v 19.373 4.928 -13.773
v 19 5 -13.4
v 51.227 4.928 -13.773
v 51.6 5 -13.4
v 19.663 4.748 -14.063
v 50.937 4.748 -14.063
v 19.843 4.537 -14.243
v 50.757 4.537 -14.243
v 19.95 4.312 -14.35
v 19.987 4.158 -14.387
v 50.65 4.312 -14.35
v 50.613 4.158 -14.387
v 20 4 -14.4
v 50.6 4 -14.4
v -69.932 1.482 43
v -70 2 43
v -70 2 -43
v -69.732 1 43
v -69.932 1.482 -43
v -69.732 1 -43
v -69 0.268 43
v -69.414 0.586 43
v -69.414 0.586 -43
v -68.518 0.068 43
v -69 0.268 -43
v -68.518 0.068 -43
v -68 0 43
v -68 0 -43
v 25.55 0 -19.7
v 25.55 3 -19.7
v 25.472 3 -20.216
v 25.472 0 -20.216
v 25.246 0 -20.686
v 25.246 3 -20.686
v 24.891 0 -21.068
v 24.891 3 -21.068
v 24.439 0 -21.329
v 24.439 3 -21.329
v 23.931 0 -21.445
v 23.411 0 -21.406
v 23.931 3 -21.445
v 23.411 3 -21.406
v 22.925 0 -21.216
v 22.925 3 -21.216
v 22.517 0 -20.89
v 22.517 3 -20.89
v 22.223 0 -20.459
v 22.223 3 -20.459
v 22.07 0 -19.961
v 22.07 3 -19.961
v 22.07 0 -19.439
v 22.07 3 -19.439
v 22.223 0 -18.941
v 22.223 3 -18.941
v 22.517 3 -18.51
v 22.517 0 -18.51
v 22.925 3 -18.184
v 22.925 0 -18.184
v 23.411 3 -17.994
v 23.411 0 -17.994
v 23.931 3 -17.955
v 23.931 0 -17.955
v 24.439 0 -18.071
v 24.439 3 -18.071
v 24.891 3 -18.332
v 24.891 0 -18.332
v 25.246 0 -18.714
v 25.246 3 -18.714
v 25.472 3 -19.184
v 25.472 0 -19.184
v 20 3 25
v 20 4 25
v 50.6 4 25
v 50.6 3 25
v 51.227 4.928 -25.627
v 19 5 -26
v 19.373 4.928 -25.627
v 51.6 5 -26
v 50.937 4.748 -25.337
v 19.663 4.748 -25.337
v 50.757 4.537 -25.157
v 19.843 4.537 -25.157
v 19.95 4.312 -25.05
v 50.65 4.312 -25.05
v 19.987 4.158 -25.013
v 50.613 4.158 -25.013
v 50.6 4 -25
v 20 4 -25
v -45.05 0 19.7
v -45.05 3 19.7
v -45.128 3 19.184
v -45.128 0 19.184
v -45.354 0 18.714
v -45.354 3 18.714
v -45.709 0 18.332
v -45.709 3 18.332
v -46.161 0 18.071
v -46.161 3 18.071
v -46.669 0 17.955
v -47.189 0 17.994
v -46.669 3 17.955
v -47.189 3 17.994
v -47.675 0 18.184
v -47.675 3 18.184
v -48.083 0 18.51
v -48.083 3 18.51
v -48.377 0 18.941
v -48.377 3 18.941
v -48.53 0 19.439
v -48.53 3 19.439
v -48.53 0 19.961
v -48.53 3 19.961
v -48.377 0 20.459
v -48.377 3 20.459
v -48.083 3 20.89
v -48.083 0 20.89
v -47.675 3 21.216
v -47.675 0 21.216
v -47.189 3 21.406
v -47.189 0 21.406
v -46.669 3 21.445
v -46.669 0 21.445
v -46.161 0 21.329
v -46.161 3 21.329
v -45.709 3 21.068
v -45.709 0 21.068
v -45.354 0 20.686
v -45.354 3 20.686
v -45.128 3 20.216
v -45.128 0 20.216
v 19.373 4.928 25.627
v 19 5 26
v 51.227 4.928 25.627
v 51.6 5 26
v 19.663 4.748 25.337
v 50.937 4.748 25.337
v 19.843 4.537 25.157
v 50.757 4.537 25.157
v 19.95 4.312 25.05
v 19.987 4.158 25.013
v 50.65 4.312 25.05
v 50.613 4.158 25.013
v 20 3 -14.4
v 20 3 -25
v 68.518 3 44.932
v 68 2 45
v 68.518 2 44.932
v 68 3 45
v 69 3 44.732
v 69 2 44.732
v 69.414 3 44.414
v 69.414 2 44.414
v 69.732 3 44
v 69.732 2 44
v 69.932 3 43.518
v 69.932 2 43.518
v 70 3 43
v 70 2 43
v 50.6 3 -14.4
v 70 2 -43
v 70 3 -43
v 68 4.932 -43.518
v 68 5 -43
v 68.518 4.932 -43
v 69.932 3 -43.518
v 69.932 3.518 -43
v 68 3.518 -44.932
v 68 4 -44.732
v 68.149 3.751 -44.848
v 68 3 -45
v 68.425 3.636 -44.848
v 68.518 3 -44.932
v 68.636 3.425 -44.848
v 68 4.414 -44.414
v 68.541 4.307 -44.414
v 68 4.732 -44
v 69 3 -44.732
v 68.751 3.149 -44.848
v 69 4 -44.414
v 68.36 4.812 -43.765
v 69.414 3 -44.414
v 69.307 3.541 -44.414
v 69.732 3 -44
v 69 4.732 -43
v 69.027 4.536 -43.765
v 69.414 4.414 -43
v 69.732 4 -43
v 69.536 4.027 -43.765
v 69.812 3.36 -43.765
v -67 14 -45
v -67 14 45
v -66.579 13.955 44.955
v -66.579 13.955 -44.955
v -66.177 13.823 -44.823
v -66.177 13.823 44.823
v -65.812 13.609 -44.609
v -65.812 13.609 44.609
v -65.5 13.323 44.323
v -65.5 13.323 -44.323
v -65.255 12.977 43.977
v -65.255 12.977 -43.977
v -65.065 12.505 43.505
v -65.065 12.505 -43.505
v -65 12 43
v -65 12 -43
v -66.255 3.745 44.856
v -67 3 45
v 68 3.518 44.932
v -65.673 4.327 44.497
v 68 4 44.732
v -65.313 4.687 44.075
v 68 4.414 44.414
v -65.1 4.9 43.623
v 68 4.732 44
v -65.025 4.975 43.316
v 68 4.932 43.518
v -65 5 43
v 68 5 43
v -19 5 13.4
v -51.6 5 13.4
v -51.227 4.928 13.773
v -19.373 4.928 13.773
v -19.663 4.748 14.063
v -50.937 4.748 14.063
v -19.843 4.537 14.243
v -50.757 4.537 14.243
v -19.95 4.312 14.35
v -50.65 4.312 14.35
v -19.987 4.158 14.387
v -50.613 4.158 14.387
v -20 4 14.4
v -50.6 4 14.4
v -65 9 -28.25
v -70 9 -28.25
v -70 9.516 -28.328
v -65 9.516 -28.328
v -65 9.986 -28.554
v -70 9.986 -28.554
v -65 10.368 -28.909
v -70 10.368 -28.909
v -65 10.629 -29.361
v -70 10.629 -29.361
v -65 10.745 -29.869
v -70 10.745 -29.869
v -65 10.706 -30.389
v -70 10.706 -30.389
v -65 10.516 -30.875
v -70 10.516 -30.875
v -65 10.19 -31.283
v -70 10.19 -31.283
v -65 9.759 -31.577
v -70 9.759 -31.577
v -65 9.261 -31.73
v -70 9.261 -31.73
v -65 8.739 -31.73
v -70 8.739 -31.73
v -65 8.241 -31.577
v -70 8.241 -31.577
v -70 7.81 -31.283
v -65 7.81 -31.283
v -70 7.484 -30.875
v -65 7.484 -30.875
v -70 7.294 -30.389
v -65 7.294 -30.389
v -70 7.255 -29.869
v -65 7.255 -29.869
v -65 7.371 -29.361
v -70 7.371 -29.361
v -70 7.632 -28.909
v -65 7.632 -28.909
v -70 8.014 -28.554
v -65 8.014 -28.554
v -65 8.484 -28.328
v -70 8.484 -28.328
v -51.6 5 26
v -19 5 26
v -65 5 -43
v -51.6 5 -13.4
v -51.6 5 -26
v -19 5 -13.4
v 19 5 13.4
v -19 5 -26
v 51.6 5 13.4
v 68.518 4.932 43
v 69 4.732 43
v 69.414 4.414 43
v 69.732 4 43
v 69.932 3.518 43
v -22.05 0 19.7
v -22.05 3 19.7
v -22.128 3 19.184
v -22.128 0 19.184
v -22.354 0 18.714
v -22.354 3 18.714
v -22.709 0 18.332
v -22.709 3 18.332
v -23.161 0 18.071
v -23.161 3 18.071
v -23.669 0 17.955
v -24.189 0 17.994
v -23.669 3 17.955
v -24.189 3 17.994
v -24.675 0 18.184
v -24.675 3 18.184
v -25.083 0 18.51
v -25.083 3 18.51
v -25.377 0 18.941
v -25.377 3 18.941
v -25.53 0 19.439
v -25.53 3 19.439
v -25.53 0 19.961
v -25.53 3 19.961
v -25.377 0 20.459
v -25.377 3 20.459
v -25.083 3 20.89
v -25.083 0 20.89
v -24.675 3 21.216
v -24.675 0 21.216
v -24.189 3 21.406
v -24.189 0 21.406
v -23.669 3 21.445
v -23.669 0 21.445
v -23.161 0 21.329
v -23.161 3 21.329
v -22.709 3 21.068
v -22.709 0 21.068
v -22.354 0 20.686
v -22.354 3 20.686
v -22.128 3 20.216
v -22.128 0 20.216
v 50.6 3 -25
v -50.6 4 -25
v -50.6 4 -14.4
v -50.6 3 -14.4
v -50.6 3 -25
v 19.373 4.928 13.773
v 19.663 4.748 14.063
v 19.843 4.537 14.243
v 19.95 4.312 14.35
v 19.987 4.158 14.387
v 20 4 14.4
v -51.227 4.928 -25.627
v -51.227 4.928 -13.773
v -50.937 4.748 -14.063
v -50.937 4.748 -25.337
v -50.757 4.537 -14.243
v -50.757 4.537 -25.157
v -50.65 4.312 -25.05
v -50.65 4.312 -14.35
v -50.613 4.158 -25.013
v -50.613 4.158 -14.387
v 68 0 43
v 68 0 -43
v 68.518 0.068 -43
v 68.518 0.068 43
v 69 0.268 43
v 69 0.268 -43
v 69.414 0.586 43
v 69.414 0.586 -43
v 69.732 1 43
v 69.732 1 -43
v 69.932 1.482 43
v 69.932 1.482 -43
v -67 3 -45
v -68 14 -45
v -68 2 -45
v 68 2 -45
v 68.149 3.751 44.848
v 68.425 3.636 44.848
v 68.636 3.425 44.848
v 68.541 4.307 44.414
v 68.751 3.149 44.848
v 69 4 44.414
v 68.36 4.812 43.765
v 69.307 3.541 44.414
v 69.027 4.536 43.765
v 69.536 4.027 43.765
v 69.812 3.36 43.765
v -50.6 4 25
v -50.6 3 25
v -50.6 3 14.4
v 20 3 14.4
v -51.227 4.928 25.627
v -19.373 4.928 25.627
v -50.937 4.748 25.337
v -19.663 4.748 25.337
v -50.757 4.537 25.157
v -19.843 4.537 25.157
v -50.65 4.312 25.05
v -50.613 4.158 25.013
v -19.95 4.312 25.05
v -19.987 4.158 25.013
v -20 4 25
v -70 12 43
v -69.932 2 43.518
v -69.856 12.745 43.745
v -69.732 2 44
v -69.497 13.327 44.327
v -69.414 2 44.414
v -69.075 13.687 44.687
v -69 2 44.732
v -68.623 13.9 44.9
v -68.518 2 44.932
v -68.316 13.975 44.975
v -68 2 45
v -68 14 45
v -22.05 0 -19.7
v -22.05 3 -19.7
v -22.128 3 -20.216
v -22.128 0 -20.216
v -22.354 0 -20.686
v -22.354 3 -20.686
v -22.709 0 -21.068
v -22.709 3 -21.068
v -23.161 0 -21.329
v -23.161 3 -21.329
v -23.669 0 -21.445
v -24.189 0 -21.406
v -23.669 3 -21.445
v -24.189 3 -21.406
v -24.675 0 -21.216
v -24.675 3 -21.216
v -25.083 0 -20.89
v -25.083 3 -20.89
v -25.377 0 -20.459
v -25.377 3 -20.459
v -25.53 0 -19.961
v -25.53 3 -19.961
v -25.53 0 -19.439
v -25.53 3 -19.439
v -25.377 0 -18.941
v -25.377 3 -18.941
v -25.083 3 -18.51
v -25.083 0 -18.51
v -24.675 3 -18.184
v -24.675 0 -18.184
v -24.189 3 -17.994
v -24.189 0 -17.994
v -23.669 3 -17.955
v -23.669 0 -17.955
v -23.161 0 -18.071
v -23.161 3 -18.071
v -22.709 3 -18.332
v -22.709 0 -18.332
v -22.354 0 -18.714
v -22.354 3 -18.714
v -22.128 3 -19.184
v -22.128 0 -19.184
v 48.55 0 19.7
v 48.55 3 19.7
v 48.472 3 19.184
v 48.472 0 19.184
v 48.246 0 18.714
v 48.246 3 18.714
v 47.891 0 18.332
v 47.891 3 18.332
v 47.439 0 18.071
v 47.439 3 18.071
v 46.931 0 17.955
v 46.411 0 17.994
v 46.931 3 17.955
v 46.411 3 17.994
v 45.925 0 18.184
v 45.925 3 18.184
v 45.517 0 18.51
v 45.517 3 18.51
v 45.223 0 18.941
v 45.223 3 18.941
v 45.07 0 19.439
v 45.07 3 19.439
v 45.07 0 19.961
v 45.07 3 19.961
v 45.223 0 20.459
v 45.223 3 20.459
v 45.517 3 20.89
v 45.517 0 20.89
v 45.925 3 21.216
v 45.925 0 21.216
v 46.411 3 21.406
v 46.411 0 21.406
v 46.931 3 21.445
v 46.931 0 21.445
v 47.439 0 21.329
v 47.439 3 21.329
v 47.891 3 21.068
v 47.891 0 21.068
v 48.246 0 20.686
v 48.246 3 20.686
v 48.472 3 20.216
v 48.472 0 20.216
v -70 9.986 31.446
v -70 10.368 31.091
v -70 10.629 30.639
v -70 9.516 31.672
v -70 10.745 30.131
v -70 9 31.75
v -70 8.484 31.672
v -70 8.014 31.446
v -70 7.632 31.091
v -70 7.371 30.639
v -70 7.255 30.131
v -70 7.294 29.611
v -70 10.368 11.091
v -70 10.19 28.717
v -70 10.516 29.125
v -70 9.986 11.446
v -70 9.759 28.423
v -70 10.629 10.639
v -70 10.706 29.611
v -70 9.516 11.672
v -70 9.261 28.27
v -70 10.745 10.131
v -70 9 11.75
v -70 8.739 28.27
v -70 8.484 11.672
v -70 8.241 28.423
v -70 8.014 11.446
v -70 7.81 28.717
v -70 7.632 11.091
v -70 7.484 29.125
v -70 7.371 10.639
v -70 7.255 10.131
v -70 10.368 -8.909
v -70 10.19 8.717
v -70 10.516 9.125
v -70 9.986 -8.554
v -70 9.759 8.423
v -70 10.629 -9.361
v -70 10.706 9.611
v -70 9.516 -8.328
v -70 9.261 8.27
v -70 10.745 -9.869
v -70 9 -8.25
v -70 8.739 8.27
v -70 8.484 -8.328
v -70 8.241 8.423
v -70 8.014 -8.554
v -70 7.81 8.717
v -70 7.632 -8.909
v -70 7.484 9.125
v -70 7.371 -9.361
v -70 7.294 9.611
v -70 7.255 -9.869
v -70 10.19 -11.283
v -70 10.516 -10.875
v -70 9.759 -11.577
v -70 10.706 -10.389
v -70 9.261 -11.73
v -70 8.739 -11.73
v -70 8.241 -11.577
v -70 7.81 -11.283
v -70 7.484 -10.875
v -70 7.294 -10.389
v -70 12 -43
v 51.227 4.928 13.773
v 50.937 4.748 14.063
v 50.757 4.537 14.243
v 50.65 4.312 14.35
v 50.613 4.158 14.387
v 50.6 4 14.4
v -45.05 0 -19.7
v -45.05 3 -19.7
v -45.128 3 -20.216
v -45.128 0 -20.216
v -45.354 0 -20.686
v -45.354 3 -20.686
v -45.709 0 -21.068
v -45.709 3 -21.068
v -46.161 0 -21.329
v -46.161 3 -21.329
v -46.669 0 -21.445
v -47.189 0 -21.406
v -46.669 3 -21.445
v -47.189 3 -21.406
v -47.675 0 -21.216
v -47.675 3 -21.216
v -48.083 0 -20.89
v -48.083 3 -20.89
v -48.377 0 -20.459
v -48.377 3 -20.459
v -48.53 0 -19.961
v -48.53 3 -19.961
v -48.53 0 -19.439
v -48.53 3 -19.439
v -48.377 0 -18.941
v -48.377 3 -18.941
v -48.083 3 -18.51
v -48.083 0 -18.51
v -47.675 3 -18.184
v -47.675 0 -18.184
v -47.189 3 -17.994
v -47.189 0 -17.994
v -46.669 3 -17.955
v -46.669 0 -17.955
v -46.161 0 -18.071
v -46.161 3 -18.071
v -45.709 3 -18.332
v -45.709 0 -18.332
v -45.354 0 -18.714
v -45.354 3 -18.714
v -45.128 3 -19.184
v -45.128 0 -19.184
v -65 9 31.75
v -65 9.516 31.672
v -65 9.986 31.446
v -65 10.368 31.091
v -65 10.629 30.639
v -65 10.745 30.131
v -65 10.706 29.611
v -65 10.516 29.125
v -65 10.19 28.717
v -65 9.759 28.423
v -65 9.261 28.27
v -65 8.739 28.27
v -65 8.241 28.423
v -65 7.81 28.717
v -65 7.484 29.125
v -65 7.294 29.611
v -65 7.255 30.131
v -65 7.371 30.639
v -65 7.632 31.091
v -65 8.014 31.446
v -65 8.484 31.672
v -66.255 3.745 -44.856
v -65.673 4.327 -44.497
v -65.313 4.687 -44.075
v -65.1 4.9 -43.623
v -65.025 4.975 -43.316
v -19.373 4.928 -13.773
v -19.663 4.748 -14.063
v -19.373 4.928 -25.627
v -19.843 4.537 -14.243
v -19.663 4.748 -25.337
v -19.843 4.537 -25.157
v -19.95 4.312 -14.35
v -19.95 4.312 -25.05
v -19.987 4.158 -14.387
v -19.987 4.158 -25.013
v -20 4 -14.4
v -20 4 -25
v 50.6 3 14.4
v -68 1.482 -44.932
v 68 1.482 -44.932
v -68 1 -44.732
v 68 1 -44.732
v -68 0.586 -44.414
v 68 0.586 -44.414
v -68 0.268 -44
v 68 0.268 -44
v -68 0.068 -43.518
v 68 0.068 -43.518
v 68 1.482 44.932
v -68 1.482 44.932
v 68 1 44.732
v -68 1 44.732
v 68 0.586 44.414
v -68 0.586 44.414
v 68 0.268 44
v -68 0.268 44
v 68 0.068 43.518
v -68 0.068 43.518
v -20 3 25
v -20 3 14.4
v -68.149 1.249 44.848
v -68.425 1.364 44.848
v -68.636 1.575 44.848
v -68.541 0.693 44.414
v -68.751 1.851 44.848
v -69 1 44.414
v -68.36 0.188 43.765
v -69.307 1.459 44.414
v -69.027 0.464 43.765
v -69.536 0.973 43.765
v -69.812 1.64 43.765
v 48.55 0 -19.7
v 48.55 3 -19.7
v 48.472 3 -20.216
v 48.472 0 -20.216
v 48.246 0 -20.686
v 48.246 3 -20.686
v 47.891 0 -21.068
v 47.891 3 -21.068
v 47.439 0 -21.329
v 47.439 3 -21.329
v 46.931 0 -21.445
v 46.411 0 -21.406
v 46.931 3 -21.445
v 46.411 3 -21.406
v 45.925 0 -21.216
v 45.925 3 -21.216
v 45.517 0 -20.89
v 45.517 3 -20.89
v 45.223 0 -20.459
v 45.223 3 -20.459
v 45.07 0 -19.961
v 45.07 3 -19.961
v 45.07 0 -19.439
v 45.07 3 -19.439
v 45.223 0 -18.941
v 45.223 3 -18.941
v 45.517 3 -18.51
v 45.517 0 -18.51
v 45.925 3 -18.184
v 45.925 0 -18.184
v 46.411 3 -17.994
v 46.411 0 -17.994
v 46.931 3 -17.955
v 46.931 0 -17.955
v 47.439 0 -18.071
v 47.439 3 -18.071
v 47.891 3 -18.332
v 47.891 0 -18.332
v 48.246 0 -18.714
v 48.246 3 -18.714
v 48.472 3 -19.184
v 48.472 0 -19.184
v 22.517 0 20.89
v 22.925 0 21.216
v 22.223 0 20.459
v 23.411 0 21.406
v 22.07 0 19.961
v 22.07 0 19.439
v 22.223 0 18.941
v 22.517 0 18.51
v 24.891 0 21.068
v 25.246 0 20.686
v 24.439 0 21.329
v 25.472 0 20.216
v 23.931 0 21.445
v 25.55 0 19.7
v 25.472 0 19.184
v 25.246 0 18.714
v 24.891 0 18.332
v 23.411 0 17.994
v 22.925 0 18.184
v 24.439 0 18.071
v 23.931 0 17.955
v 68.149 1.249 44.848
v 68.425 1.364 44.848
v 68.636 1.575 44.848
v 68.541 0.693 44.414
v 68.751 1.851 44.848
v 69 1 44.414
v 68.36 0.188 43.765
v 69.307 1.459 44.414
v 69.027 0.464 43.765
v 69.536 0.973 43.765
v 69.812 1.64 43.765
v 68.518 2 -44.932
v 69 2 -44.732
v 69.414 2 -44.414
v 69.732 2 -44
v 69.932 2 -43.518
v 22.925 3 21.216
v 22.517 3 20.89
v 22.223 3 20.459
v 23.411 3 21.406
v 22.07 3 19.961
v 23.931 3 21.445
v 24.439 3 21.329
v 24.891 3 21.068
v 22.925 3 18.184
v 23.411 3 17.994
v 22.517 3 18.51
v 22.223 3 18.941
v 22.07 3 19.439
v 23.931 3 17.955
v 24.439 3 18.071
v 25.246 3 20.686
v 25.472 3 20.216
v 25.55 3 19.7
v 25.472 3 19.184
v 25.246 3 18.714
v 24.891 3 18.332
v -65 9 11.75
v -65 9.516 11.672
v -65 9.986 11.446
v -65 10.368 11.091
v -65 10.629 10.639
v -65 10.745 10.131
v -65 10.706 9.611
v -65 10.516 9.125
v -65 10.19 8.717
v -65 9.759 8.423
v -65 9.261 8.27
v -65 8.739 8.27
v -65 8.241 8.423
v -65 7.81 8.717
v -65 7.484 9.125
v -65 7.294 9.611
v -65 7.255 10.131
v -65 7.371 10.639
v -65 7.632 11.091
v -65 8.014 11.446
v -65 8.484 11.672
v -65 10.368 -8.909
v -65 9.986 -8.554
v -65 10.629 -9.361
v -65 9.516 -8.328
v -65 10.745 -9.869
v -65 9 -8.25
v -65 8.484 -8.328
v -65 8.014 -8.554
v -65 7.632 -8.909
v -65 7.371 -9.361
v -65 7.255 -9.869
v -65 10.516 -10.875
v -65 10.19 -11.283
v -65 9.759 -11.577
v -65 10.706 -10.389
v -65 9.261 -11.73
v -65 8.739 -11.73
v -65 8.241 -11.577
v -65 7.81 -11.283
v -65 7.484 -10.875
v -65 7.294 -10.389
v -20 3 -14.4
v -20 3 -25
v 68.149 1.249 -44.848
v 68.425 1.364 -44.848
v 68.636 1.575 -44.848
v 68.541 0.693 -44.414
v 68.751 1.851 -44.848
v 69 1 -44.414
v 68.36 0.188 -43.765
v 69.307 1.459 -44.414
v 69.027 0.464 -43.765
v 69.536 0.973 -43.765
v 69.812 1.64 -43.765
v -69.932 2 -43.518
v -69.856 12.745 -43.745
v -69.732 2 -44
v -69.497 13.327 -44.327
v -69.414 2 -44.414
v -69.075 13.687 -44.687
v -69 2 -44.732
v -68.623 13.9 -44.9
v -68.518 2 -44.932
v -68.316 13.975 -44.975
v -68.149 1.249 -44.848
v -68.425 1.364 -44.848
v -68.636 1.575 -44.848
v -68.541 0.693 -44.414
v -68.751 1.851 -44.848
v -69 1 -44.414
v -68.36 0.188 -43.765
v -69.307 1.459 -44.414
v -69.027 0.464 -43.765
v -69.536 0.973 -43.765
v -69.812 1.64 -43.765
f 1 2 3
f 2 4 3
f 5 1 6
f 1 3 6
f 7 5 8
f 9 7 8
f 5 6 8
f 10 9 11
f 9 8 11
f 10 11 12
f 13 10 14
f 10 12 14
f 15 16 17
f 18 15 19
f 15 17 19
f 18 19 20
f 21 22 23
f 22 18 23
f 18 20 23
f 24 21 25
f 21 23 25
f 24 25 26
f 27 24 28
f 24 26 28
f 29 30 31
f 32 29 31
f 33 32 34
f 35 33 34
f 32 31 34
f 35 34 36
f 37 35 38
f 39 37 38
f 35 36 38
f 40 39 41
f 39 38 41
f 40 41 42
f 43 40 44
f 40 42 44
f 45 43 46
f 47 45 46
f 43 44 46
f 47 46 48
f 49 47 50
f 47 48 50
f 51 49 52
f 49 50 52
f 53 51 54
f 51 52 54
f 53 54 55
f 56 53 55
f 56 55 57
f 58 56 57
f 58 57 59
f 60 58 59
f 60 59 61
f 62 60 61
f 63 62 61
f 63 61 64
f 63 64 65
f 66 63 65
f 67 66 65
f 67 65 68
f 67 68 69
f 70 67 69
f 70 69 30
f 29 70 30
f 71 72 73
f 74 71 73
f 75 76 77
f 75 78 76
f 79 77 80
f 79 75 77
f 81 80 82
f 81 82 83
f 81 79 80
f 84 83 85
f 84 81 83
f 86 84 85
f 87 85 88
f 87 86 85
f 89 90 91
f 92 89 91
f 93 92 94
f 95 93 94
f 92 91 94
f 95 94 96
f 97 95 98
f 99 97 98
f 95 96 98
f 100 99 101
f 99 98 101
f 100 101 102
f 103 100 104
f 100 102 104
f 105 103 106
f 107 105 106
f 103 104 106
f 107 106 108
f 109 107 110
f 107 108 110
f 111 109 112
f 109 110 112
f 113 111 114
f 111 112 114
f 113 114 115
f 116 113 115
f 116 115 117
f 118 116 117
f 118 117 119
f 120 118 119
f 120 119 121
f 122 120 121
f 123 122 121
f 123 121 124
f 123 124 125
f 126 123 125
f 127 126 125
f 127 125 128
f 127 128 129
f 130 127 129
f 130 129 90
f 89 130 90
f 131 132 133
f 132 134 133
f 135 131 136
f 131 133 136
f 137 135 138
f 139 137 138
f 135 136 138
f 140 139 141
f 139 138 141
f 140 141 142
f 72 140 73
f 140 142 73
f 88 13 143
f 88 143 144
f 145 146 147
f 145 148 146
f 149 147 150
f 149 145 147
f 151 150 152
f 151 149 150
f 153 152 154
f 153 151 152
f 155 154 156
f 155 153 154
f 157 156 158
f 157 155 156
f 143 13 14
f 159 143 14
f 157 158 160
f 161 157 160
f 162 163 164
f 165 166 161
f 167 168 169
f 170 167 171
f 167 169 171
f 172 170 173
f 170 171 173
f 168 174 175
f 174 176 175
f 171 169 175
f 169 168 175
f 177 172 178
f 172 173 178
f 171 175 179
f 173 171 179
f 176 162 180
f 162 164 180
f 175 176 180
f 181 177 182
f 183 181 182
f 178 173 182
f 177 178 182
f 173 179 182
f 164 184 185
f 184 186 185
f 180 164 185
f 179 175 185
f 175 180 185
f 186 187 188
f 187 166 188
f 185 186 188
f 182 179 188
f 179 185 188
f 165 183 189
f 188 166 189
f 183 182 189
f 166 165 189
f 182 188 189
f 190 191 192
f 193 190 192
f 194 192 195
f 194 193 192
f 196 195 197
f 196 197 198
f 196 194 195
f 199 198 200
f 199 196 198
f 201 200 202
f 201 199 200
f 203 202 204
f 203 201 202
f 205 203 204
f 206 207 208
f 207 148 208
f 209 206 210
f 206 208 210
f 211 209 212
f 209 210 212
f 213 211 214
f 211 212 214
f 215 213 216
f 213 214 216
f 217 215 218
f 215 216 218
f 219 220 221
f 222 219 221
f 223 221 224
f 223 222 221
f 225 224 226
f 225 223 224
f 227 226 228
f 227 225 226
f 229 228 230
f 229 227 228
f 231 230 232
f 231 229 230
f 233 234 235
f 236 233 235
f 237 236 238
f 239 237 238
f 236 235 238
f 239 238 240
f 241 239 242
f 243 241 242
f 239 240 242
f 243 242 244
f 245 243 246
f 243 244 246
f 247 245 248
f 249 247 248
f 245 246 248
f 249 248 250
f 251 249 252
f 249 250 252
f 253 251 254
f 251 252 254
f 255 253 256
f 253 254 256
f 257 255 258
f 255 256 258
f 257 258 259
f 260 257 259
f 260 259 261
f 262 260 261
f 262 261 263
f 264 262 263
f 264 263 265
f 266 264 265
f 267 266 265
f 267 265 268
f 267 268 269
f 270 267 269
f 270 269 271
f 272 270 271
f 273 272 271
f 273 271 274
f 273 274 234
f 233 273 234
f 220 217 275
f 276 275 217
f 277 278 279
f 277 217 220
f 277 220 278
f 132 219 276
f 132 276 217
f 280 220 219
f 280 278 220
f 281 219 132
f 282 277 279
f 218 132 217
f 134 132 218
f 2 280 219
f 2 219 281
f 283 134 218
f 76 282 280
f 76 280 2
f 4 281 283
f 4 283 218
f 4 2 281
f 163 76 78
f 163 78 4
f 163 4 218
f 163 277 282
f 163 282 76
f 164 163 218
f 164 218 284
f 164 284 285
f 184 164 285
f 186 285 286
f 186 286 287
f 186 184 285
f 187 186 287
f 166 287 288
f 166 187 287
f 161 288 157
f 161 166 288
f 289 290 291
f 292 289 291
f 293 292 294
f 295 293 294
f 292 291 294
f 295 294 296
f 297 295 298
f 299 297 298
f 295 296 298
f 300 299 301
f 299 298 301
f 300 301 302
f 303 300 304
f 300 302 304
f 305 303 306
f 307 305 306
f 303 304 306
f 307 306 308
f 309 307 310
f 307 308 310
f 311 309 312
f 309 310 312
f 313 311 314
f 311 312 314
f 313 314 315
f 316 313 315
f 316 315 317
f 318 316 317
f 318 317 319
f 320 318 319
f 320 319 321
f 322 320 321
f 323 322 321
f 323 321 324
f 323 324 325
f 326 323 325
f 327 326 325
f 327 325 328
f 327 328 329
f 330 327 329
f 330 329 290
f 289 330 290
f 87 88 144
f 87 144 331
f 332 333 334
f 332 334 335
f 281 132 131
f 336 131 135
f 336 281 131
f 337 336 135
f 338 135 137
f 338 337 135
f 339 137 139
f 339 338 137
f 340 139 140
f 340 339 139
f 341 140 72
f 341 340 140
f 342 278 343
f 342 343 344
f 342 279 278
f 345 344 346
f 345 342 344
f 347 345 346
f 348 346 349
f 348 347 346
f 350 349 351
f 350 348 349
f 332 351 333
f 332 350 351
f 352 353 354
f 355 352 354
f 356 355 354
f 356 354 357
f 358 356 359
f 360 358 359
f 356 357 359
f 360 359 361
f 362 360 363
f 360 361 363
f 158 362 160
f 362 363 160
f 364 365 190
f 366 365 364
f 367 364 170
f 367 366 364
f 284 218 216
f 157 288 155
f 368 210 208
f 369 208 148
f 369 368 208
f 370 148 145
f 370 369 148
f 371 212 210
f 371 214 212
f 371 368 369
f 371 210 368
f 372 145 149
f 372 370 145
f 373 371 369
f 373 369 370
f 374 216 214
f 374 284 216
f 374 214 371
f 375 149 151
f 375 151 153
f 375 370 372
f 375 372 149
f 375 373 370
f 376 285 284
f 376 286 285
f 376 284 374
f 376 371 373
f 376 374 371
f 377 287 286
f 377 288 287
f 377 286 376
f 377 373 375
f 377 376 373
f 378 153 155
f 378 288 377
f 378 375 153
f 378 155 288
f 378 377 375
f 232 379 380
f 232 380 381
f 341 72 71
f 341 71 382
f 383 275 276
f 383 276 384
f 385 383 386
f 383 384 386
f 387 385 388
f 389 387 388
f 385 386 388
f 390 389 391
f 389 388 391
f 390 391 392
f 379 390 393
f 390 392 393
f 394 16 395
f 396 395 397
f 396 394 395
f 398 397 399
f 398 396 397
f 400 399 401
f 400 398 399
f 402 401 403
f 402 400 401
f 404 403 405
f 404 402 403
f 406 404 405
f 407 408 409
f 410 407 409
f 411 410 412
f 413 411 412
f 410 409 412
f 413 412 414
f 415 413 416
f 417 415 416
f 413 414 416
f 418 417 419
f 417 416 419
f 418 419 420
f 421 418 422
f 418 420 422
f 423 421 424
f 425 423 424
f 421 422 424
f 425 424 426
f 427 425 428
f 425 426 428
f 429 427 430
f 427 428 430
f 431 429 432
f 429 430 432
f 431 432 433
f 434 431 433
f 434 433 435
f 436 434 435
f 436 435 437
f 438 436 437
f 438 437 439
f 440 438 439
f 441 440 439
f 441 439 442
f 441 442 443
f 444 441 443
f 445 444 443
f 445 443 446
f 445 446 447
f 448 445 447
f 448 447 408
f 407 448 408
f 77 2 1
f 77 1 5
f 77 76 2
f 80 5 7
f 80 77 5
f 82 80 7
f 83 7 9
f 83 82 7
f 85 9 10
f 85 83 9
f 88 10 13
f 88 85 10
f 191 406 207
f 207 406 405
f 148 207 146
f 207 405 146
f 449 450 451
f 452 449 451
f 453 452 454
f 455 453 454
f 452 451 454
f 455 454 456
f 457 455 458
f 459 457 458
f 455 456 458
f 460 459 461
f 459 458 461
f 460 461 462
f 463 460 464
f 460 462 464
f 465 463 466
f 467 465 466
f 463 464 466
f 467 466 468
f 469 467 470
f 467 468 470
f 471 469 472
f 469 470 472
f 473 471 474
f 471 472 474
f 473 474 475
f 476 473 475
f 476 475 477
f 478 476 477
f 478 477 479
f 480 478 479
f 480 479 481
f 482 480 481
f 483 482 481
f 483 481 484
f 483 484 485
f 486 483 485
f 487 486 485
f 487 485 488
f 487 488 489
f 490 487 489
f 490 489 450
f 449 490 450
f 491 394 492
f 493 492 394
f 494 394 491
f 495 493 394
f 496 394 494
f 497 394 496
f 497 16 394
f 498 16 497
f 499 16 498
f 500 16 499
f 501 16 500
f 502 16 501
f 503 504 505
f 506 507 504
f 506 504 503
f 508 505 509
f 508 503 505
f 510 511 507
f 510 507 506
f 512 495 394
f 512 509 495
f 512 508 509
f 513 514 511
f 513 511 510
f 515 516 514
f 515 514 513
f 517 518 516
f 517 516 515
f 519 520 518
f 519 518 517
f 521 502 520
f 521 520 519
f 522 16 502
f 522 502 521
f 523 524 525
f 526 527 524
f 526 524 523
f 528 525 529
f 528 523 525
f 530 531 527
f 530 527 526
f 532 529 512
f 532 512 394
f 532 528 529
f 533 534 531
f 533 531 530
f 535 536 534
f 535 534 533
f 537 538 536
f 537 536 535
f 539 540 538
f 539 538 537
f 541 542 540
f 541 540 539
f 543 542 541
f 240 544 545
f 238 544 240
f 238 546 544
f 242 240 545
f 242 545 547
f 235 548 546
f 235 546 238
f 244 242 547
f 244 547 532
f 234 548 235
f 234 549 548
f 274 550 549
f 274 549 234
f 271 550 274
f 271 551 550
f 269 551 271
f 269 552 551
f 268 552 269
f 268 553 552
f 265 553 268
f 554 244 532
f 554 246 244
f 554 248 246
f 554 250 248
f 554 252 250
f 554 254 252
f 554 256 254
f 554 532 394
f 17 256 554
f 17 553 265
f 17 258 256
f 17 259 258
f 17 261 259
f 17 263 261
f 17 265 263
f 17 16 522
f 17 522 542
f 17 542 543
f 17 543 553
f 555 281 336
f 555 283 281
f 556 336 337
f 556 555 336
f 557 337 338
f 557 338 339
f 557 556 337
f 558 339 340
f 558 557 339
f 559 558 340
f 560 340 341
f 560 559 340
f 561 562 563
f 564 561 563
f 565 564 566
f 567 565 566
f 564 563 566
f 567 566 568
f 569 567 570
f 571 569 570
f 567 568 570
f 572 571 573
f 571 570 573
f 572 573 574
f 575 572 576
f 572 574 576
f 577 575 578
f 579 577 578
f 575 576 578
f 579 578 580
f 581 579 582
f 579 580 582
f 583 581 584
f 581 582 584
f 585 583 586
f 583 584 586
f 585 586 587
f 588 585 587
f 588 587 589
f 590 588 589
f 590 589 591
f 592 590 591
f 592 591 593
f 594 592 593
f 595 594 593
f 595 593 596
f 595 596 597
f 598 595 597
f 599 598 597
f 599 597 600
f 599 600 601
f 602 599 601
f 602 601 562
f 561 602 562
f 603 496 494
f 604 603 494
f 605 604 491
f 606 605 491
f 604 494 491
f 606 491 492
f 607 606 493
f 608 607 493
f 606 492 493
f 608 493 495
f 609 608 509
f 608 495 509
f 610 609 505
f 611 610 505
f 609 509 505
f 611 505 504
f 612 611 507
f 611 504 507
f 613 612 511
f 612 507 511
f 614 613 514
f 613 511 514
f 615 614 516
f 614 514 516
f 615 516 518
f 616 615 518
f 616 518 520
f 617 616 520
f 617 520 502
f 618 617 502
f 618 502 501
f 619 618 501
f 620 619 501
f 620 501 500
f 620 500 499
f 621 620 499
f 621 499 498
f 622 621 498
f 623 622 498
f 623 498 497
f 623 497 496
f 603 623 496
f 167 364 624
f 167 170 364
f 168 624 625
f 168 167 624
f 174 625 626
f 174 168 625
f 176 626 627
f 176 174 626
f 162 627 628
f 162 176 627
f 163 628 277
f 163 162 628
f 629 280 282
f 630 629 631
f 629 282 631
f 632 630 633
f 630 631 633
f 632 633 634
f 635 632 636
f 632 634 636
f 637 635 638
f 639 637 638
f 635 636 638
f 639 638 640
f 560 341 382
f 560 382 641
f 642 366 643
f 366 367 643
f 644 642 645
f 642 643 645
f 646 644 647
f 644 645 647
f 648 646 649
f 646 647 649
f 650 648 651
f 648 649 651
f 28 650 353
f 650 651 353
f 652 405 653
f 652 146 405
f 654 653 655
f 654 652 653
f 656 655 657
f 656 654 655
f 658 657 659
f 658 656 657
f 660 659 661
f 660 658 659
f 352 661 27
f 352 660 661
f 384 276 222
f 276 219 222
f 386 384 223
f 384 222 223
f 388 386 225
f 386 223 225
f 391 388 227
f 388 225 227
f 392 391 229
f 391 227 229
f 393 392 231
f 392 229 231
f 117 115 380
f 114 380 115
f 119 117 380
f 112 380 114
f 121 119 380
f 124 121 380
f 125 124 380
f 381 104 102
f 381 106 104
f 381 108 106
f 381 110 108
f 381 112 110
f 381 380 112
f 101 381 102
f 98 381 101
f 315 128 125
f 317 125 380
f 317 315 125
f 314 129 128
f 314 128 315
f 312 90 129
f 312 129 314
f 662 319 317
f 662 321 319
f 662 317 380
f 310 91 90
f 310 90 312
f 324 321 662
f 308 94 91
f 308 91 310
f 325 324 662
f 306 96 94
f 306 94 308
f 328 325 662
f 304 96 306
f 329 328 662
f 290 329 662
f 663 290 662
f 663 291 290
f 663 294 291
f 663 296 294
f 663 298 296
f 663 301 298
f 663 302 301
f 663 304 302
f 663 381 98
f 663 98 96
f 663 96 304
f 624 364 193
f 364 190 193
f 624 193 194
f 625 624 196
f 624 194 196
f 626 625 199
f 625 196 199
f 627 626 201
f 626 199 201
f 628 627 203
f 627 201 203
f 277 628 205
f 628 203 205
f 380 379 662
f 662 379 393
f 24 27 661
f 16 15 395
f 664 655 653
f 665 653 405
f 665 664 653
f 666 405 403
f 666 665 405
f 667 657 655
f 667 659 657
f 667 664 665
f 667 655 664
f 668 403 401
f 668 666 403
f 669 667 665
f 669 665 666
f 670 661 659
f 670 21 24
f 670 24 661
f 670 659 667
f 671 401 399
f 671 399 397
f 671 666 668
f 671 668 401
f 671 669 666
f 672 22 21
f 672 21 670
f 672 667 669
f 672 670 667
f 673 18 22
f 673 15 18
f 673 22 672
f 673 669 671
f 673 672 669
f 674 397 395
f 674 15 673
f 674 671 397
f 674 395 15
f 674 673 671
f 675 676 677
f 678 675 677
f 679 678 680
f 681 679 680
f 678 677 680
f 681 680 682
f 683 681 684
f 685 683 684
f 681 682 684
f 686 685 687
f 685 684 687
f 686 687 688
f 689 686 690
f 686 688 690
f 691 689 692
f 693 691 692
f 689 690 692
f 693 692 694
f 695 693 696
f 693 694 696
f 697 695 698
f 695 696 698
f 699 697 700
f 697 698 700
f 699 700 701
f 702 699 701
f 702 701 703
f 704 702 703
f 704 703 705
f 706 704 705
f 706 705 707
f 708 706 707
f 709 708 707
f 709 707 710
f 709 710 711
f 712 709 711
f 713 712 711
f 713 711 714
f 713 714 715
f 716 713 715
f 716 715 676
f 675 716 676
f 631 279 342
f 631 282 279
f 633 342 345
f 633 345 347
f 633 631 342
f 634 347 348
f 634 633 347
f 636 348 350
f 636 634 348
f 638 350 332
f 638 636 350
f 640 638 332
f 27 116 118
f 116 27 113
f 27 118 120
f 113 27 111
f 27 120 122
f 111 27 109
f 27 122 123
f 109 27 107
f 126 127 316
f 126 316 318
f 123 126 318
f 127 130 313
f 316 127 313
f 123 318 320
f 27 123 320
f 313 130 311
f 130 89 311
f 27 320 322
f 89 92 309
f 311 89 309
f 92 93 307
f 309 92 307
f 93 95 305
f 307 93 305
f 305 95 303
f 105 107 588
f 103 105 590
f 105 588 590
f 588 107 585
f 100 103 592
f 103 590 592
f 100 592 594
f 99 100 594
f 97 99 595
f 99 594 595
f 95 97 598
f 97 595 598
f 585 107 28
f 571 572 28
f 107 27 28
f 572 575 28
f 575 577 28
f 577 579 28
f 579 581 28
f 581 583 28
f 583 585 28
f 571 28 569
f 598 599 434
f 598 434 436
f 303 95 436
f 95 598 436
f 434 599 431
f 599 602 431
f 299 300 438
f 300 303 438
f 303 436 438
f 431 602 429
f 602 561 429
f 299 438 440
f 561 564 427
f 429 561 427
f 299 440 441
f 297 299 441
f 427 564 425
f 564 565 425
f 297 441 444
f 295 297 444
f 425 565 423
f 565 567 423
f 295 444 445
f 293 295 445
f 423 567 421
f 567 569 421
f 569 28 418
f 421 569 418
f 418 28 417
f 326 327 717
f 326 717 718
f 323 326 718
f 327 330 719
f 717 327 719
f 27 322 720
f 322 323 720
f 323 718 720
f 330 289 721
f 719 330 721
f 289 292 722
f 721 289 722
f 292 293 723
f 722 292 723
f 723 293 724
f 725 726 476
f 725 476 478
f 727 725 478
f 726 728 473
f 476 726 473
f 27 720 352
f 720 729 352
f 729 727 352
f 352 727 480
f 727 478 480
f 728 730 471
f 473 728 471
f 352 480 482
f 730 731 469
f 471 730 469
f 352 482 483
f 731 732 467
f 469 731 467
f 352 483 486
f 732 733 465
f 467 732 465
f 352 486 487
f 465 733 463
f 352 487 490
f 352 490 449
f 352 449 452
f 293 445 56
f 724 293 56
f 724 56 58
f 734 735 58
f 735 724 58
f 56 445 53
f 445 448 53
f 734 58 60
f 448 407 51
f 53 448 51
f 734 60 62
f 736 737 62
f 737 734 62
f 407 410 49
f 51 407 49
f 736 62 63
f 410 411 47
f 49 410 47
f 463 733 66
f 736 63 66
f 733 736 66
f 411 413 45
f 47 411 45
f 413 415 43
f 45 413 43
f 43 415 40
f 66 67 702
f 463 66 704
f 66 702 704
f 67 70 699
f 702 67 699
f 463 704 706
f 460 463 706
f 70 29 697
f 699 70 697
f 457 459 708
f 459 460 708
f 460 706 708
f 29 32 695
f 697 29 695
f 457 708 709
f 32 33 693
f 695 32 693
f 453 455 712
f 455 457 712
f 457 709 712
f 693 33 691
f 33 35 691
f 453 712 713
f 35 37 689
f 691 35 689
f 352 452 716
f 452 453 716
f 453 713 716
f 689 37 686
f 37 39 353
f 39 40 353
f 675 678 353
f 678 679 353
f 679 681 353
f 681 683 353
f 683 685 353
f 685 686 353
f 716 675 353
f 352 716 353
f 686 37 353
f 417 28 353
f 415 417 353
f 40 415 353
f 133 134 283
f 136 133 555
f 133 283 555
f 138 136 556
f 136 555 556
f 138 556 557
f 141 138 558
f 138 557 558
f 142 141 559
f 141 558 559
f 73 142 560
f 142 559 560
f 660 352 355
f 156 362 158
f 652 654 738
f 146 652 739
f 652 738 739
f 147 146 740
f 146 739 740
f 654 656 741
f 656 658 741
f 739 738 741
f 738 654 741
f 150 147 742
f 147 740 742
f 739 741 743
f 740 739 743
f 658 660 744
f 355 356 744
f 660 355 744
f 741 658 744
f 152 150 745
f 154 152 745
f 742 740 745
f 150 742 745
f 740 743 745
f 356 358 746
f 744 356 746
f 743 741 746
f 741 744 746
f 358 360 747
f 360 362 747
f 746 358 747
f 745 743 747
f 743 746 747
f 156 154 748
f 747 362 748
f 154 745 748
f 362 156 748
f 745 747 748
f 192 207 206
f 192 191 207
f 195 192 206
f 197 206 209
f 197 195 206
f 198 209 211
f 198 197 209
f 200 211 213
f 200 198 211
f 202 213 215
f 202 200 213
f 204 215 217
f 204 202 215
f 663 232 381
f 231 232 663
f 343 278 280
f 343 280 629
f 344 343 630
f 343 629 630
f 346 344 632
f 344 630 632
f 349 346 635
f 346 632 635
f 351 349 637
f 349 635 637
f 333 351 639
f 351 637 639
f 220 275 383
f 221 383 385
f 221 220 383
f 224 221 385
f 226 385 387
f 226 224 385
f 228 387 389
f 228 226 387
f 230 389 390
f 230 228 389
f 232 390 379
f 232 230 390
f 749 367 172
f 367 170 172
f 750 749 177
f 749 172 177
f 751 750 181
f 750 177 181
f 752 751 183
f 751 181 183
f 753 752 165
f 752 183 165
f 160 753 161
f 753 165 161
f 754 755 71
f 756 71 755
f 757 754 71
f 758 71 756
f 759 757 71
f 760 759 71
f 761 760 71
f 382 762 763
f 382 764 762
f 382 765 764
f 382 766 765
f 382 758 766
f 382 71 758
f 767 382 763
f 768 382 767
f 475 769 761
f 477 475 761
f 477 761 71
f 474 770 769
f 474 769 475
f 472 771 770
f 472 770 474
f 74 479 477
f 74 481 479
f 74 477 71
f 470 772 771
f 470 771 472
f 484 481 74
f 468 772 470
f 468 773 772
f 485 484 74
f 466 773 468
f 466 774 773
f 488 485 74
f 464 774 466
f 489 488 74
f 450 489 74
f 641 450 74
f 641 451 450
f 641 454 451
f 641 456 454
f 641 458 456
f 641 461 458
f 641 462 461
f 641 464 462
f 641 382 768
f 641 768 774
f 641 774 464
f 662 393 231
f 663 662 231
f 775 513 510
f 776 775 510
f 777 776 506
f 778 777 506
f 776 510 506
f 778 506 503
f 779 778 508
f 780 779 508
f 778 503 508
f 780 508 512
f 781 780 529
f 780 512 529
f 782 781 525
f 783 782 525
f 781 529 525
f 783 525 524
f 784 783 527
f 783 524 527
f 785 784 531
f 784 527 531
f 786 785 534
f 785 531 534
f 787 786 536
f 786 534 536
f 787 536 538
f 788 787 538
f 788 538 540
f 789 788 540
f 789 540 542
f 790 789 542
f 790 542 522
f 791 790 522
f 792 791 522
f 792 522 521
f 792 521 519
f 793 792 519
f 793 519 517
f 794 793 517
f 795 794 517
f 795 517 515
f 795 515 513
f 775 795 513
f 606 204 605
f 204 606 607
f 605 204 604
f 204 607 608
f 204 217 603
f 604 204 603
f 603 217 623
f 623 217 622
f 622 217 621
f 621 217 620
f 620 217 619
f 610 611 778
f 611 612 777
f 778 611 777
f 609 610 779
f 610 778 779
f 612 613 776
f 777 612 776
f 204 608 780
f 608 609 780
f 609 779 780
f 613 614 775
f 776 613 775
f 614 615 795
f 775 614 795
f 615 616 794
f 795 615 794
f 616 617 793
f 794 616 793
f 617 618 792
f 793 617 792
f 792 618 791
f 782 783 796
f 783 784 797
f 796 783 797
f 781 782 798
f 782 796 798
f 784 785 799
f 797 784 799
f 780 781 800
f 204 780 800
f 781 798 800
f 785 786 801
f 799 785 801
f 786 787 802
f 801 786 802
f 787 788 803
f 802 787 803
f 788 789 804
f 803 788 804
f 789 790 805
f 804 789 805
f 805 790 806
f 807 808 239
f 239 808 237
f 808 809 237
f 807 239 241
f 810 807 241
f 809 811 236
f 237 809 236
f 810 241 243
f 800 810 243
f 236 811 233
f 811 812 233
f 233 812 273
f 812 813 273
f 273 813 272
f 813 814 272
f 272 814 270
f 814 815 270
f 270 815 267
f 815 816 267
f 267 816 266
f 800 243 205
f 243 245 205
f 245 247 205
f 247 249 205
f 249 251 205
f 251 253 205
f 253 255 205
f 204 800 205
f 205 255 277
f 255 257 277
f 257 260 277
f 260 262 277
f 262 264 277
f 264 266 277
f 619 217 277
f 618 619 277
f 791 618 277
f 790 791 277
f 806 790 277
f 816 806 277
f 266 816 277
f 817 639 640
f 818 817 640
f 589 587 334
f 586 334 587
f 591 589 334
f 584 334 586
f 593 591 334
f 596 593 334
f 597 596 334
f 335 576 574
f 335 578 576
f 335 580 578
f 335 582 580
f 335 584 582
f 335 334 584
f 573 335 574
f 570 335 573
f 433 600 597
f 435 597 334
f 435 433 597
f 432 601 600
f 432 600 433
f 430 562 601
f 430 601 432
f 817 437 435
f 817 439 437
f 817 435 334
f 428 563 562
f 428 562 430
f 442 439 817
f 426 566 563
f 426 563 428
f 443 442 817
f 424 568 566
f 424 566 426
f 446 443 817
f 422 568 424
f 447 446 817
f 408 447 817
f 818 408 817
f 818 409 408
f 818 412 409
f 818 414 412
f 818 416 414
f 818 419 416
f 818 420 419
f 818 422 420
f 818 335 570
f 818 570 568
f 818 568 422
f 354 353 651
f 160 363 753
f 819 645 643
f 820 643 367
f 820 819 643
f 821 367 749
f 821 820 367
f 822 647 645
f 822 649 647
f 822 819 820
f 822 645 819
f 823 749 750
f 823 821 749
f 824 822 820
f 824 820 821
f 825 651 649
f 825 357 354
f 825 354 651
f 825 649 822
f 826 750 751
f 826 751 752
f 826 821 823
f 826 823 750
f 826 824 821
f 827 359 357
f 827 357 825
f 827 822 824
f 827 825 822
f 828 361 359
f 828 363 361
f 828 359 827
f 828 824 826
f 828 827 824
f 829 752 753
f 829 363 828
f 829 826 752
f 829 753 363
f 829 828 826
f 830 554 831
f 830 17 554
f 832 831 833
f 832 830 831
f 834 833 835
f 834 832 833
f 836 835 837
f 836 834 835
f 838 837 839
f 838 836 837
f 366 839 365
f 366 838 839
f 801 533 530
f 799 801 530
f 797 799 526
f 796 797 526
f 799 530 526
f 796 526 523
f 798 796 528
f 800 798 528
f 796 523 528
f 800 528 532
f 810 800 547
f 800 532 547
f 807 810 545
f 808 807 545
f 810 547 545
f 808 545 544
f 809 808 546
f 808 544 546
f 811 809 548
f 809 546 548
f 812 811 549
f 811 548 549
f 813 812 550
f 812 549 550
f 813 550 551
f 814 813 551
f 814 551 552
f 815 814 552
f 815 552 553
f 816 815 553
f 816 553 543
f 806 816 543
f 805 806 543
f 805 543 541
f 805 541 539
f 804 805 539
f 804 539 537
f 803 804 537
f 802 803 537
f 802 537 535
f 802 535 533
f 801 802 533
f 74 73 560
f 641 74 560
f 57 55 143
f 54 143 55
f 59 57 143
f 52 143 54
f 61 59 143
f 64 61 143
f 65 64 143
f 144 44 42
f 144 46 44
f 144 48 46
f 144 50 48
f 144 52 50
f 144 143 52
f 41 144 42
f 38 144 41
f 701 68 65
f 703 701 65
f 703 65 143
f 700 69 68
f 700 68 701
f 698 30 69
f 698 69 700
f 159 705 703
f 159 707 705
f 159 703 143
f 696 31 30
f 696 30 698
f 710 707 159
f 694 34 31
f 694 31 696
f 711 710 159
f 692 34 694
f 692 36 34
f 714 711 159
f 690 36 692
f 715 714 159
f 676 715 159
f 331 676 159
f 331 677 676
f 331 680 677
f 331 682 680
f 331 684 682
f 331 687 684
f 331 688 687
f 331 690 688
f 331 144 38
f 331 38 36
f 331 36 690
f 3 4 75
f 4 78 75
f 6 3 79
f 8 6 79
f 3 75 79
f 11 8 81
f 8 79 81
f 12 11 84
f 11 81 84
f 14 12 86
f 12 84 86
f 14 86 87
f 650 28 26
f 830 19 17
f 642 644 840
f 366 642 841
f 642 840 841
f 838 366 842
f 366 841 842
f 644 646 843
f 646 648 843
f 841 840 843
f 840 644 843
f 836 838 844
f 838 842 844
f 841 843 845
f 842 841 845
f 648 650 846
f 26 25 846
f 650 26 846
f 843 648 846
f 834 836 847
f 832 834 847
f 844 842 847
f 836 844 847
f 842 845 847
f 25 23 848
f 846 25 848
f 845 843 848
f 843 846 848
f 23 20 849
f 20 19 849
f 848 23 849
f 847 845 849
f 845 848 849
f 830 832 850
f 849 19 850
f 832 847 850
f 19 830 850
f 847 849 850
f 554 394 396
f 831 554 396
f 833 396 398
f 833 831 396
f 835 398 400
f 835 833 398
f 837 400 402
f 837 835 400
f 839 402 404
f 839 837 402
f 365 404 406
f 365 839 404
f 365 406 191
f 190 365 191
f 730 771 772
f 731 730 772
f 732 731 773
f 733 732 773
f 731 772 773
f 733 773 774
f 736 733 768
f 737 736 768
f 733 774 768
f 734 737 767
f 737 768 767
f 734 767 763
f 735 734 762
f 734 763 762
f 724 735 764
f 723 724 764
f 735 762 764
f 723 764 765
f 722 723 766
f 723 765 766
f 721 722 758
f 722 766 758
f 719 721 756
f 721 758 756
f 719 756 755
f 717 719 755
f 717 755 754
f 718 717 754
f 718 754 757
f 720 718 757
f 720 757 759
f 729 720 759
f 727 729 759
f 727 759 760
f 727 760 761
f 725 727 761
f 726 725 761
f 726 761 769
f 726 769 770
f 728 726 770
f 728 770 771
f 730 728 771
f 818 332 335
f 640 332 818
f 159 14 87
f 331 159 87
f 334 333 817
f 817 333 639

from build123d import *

# Parameters (mm, degrees)
SKETCH_1_W          = 140
SKETCH_1_H          = 90
EXTRUDE_1_DEPTH     = 5
SKETCH_2_W          = 5
SKETCH_2_H          = 90
EXTRUDE_2_DEPTH     = 9
SKETCH_3_R          = 1.75
CUT_EXTRUDE_1_DEPTH = 11
SKETCH_5_W          = 30.6
SKETCH_5_H          = 10.6
SKETCH_5_R          = 1.75
CUT_EXTRUDE_2_DEPTH = 2
SKETCH_5_3_R        = 1.75
CUT_EXTRUDE_3_DEPTH = 84.701851831
FILLET_1_R          = 2
FILLET_2_R          = 1


with BuildPart() as part:
    # ｽｹｯﾁ1 → ﾎﾞｽ - 押し出し1 (new body)
    with BuildSketch(Plane(origin=(0, 0, 0), x_dir=(1, 0, 0), z_dir=(0, 1, 0))):
        Rectangle(SKETCH_1_W, SKETCH_1_H)
    extrude(amount=EXTRUDE_1_DEPTH)

    # ｽｹｯﾁ2 → ﾎﾞｽ - 押し出し2 (add)
    with BuildSketch(Plane(origin=(0, 5, 0), x_dir=(1, 0, 0), z_dir=(0, 1, 0))):
        with Locations((-67.5, 0)):
            Rectangle(SKETCH_2_W, SKETCH_2_H)
    extrude(amount=EXTRUDE_2_DEPTH)

    # ｽｹｯﾁ3 → ｶｯﾄ - 押し出し1 (cut)
    with BuildSketch(Plane.ZY.offset(70)):
        with Locations((-30, 9)):
            Circle(SKETCH_3_R)
        with Locations((-10, 9)):
            Circle(SKETCH_3_R)
        with Locations((30, 9)):
            Circle(SKETCH_3_R)
        with Locations((10, 9)):
            Circle(SKETCH_3_R)
    extrude(amount=-CUT_EXTRUDE_1_DEPTH, mode=Mode.SUBTRACT)

    # ｽｹｯﾁ5 → ｶｯﾄ - 押し出し2 (cut)
    # profile 1 of 4: a face of its own
    with BuildSketch(Plane(origin=(0, 5, 0), x_dir=(1, 0, 0), z_dir=(0, 1, 0))):
        with Locations((-35.3, -19.7)):
            Rectangle(SKETCH_5_W, SKETCH_5_H)
        with Locations((-46.8, -19.7)):
            Circle(SKETCH_5_R, mode=Mode.SUBTRACT)
        with Locations((-23.8, -19.7)):
            Circle(SKETCH_5_R, mode=Mode.SUBTRACT)
    # profile 2 of 4: a face of its own
    with BuildSketch(Plane(origin=(0, 5, 0), x_dir=(1, 0, 0), z_dir=(0, 1, 0))):
        with Locations((-35.3, 19.7)):
            Rectangle(SKETCH_5_W, SKETCH_5_H)
        with Locations((-23.8, 19.7)):
            Circle(SKETCH_5_R, mode=Mode.SUBTRACT)
        with Locations((-46.8, 19.7)):
            Circle(SKETCH_5_R, mode=Mode.SUBTRACT)
    # profile 3 of 4: a face of its own
    with BuildSketch(Plane(origin=(0, 5, 0), x_dir=(1, 0, 0), z_dir=(0, 1, 0))):
        with Locations((35.3, 19.7)):
            Rectangle(SKETCH_5_W, SKETCH_5_H)
        with Locations((46.8, 19.7)):
            Circle(SKETCH_5_R, mode=Mode.SUBTRACT)
        with Locations((23.8, 19.7)):
            Circle(SKETCH_5_R, mode=Mode.SUBTRACT)
    # profile 4 of 4: a face of its own
    with BuildSketch(Plane(origin=(0, 5, 0), x_dir=(1, 0, 0), z_dir=(0, 1, 0))):
        with Locations((35.3, -19.7)):
            Rectangle(SKETCH_5_W, SKETCH_5_H)
        with Locations((23.8, -19.7)):
            Circle(SKETCH_5_R, mode=Mode.SUBTRACT)
        with Locations((46.8, -19.7)):
            Circle(SKETCH_5_R, mode=Mode.SUBTRACT)
    extrude(amount=-CUT_EXTRUDE_2_DEPTH, mode=Mode.SUBTRACT)

    # ｽｹｯﾁ5<3> → ｶｯﾄ - 押し出し3 (cut, through all)
    with BuildSketch(Plane(origin=(0, 5, 0), x_dir=(1, 0, 0), z_dir=(0, 1, 0))):
        with Locations((-46.8, -19.7)):
            Circle(SKETCH_5_3_R)
        with Locations((-23.8, -19.7)):
            Circle(SKETCH_5_3_R)
        with Locations((-23.8, 19.7)):
            Circle(SKETCH_5_3_R)
        with Locations((-46.8, 19.7)):
            Circle(SKETCH_5_3_R)
        with Locations((46.8, 19.7)):
            Circle(SKETCH_5_3_R)
        with Locations((23.8, 19.7)):
            Circle(SKETCH_5_3_R)
        with Locations((23.8, -19.7)):
            Circle(SKETCH_5_3_R)
        with Locations((46.8, -19.7)):
            Circle(SKETCH_5_3_R)
    extrude(amount=-CUT_EXTRUDE_3_DEPTH, mode=Mode.SUBTRACT)

    # ﾌｨﾚｯﾄ1
    fillet_1_edges = [part.edges().sort_by_distance(p)[0] for p in [
        (70, 0, 0),
        (70, 5, 0),
        (-65, 14, 0),
        (-70, 14, 0),
        (-70, 0, 0),
        (0, 0, -45),
        (2.5, 5, -45),
        (0, 0, 45),
        (2.5, 5, 45),
        (-65, 9.5, 45),
        (-65, 9.5, -45),
        (-70, 7, 45),
        (-70, 7, -45),
        (70, 2.5, 45),
        (70, 2.5, -45),
    ]]
    fillet(fillet_1_edges, radius=FILLET_1_R)

    # ﾌｨﾚｯﾄ2
    fillet_2_edges = [part.edges().sort_by_distance(p)[0] for p in [
        (20, 5, -19.7),
        (35.3, 5, -25),
        (35.3, 5, -14.4),
        (50.6, 5, -19.7),
        (50.6, 5, 19.7),
        (35.3, 5, 25),
        (20, 5, 19.7),
        (35.3, 5, 14.4),
        (-50.6, 5, -19.7),
        (-35.3, 5, -25),
        (-35.3, 5, -14.4),
        (-20, 5, -19.7),
        (-50.6, 5, 19.7),
        (-35.3, 5, 14.4),
        (-20, 5, 19.7),
        (-35.3, 5, 25),
    ]]
    fillet(fillet_2_edges, radius=FILLET_2_R)


solid = part.part
